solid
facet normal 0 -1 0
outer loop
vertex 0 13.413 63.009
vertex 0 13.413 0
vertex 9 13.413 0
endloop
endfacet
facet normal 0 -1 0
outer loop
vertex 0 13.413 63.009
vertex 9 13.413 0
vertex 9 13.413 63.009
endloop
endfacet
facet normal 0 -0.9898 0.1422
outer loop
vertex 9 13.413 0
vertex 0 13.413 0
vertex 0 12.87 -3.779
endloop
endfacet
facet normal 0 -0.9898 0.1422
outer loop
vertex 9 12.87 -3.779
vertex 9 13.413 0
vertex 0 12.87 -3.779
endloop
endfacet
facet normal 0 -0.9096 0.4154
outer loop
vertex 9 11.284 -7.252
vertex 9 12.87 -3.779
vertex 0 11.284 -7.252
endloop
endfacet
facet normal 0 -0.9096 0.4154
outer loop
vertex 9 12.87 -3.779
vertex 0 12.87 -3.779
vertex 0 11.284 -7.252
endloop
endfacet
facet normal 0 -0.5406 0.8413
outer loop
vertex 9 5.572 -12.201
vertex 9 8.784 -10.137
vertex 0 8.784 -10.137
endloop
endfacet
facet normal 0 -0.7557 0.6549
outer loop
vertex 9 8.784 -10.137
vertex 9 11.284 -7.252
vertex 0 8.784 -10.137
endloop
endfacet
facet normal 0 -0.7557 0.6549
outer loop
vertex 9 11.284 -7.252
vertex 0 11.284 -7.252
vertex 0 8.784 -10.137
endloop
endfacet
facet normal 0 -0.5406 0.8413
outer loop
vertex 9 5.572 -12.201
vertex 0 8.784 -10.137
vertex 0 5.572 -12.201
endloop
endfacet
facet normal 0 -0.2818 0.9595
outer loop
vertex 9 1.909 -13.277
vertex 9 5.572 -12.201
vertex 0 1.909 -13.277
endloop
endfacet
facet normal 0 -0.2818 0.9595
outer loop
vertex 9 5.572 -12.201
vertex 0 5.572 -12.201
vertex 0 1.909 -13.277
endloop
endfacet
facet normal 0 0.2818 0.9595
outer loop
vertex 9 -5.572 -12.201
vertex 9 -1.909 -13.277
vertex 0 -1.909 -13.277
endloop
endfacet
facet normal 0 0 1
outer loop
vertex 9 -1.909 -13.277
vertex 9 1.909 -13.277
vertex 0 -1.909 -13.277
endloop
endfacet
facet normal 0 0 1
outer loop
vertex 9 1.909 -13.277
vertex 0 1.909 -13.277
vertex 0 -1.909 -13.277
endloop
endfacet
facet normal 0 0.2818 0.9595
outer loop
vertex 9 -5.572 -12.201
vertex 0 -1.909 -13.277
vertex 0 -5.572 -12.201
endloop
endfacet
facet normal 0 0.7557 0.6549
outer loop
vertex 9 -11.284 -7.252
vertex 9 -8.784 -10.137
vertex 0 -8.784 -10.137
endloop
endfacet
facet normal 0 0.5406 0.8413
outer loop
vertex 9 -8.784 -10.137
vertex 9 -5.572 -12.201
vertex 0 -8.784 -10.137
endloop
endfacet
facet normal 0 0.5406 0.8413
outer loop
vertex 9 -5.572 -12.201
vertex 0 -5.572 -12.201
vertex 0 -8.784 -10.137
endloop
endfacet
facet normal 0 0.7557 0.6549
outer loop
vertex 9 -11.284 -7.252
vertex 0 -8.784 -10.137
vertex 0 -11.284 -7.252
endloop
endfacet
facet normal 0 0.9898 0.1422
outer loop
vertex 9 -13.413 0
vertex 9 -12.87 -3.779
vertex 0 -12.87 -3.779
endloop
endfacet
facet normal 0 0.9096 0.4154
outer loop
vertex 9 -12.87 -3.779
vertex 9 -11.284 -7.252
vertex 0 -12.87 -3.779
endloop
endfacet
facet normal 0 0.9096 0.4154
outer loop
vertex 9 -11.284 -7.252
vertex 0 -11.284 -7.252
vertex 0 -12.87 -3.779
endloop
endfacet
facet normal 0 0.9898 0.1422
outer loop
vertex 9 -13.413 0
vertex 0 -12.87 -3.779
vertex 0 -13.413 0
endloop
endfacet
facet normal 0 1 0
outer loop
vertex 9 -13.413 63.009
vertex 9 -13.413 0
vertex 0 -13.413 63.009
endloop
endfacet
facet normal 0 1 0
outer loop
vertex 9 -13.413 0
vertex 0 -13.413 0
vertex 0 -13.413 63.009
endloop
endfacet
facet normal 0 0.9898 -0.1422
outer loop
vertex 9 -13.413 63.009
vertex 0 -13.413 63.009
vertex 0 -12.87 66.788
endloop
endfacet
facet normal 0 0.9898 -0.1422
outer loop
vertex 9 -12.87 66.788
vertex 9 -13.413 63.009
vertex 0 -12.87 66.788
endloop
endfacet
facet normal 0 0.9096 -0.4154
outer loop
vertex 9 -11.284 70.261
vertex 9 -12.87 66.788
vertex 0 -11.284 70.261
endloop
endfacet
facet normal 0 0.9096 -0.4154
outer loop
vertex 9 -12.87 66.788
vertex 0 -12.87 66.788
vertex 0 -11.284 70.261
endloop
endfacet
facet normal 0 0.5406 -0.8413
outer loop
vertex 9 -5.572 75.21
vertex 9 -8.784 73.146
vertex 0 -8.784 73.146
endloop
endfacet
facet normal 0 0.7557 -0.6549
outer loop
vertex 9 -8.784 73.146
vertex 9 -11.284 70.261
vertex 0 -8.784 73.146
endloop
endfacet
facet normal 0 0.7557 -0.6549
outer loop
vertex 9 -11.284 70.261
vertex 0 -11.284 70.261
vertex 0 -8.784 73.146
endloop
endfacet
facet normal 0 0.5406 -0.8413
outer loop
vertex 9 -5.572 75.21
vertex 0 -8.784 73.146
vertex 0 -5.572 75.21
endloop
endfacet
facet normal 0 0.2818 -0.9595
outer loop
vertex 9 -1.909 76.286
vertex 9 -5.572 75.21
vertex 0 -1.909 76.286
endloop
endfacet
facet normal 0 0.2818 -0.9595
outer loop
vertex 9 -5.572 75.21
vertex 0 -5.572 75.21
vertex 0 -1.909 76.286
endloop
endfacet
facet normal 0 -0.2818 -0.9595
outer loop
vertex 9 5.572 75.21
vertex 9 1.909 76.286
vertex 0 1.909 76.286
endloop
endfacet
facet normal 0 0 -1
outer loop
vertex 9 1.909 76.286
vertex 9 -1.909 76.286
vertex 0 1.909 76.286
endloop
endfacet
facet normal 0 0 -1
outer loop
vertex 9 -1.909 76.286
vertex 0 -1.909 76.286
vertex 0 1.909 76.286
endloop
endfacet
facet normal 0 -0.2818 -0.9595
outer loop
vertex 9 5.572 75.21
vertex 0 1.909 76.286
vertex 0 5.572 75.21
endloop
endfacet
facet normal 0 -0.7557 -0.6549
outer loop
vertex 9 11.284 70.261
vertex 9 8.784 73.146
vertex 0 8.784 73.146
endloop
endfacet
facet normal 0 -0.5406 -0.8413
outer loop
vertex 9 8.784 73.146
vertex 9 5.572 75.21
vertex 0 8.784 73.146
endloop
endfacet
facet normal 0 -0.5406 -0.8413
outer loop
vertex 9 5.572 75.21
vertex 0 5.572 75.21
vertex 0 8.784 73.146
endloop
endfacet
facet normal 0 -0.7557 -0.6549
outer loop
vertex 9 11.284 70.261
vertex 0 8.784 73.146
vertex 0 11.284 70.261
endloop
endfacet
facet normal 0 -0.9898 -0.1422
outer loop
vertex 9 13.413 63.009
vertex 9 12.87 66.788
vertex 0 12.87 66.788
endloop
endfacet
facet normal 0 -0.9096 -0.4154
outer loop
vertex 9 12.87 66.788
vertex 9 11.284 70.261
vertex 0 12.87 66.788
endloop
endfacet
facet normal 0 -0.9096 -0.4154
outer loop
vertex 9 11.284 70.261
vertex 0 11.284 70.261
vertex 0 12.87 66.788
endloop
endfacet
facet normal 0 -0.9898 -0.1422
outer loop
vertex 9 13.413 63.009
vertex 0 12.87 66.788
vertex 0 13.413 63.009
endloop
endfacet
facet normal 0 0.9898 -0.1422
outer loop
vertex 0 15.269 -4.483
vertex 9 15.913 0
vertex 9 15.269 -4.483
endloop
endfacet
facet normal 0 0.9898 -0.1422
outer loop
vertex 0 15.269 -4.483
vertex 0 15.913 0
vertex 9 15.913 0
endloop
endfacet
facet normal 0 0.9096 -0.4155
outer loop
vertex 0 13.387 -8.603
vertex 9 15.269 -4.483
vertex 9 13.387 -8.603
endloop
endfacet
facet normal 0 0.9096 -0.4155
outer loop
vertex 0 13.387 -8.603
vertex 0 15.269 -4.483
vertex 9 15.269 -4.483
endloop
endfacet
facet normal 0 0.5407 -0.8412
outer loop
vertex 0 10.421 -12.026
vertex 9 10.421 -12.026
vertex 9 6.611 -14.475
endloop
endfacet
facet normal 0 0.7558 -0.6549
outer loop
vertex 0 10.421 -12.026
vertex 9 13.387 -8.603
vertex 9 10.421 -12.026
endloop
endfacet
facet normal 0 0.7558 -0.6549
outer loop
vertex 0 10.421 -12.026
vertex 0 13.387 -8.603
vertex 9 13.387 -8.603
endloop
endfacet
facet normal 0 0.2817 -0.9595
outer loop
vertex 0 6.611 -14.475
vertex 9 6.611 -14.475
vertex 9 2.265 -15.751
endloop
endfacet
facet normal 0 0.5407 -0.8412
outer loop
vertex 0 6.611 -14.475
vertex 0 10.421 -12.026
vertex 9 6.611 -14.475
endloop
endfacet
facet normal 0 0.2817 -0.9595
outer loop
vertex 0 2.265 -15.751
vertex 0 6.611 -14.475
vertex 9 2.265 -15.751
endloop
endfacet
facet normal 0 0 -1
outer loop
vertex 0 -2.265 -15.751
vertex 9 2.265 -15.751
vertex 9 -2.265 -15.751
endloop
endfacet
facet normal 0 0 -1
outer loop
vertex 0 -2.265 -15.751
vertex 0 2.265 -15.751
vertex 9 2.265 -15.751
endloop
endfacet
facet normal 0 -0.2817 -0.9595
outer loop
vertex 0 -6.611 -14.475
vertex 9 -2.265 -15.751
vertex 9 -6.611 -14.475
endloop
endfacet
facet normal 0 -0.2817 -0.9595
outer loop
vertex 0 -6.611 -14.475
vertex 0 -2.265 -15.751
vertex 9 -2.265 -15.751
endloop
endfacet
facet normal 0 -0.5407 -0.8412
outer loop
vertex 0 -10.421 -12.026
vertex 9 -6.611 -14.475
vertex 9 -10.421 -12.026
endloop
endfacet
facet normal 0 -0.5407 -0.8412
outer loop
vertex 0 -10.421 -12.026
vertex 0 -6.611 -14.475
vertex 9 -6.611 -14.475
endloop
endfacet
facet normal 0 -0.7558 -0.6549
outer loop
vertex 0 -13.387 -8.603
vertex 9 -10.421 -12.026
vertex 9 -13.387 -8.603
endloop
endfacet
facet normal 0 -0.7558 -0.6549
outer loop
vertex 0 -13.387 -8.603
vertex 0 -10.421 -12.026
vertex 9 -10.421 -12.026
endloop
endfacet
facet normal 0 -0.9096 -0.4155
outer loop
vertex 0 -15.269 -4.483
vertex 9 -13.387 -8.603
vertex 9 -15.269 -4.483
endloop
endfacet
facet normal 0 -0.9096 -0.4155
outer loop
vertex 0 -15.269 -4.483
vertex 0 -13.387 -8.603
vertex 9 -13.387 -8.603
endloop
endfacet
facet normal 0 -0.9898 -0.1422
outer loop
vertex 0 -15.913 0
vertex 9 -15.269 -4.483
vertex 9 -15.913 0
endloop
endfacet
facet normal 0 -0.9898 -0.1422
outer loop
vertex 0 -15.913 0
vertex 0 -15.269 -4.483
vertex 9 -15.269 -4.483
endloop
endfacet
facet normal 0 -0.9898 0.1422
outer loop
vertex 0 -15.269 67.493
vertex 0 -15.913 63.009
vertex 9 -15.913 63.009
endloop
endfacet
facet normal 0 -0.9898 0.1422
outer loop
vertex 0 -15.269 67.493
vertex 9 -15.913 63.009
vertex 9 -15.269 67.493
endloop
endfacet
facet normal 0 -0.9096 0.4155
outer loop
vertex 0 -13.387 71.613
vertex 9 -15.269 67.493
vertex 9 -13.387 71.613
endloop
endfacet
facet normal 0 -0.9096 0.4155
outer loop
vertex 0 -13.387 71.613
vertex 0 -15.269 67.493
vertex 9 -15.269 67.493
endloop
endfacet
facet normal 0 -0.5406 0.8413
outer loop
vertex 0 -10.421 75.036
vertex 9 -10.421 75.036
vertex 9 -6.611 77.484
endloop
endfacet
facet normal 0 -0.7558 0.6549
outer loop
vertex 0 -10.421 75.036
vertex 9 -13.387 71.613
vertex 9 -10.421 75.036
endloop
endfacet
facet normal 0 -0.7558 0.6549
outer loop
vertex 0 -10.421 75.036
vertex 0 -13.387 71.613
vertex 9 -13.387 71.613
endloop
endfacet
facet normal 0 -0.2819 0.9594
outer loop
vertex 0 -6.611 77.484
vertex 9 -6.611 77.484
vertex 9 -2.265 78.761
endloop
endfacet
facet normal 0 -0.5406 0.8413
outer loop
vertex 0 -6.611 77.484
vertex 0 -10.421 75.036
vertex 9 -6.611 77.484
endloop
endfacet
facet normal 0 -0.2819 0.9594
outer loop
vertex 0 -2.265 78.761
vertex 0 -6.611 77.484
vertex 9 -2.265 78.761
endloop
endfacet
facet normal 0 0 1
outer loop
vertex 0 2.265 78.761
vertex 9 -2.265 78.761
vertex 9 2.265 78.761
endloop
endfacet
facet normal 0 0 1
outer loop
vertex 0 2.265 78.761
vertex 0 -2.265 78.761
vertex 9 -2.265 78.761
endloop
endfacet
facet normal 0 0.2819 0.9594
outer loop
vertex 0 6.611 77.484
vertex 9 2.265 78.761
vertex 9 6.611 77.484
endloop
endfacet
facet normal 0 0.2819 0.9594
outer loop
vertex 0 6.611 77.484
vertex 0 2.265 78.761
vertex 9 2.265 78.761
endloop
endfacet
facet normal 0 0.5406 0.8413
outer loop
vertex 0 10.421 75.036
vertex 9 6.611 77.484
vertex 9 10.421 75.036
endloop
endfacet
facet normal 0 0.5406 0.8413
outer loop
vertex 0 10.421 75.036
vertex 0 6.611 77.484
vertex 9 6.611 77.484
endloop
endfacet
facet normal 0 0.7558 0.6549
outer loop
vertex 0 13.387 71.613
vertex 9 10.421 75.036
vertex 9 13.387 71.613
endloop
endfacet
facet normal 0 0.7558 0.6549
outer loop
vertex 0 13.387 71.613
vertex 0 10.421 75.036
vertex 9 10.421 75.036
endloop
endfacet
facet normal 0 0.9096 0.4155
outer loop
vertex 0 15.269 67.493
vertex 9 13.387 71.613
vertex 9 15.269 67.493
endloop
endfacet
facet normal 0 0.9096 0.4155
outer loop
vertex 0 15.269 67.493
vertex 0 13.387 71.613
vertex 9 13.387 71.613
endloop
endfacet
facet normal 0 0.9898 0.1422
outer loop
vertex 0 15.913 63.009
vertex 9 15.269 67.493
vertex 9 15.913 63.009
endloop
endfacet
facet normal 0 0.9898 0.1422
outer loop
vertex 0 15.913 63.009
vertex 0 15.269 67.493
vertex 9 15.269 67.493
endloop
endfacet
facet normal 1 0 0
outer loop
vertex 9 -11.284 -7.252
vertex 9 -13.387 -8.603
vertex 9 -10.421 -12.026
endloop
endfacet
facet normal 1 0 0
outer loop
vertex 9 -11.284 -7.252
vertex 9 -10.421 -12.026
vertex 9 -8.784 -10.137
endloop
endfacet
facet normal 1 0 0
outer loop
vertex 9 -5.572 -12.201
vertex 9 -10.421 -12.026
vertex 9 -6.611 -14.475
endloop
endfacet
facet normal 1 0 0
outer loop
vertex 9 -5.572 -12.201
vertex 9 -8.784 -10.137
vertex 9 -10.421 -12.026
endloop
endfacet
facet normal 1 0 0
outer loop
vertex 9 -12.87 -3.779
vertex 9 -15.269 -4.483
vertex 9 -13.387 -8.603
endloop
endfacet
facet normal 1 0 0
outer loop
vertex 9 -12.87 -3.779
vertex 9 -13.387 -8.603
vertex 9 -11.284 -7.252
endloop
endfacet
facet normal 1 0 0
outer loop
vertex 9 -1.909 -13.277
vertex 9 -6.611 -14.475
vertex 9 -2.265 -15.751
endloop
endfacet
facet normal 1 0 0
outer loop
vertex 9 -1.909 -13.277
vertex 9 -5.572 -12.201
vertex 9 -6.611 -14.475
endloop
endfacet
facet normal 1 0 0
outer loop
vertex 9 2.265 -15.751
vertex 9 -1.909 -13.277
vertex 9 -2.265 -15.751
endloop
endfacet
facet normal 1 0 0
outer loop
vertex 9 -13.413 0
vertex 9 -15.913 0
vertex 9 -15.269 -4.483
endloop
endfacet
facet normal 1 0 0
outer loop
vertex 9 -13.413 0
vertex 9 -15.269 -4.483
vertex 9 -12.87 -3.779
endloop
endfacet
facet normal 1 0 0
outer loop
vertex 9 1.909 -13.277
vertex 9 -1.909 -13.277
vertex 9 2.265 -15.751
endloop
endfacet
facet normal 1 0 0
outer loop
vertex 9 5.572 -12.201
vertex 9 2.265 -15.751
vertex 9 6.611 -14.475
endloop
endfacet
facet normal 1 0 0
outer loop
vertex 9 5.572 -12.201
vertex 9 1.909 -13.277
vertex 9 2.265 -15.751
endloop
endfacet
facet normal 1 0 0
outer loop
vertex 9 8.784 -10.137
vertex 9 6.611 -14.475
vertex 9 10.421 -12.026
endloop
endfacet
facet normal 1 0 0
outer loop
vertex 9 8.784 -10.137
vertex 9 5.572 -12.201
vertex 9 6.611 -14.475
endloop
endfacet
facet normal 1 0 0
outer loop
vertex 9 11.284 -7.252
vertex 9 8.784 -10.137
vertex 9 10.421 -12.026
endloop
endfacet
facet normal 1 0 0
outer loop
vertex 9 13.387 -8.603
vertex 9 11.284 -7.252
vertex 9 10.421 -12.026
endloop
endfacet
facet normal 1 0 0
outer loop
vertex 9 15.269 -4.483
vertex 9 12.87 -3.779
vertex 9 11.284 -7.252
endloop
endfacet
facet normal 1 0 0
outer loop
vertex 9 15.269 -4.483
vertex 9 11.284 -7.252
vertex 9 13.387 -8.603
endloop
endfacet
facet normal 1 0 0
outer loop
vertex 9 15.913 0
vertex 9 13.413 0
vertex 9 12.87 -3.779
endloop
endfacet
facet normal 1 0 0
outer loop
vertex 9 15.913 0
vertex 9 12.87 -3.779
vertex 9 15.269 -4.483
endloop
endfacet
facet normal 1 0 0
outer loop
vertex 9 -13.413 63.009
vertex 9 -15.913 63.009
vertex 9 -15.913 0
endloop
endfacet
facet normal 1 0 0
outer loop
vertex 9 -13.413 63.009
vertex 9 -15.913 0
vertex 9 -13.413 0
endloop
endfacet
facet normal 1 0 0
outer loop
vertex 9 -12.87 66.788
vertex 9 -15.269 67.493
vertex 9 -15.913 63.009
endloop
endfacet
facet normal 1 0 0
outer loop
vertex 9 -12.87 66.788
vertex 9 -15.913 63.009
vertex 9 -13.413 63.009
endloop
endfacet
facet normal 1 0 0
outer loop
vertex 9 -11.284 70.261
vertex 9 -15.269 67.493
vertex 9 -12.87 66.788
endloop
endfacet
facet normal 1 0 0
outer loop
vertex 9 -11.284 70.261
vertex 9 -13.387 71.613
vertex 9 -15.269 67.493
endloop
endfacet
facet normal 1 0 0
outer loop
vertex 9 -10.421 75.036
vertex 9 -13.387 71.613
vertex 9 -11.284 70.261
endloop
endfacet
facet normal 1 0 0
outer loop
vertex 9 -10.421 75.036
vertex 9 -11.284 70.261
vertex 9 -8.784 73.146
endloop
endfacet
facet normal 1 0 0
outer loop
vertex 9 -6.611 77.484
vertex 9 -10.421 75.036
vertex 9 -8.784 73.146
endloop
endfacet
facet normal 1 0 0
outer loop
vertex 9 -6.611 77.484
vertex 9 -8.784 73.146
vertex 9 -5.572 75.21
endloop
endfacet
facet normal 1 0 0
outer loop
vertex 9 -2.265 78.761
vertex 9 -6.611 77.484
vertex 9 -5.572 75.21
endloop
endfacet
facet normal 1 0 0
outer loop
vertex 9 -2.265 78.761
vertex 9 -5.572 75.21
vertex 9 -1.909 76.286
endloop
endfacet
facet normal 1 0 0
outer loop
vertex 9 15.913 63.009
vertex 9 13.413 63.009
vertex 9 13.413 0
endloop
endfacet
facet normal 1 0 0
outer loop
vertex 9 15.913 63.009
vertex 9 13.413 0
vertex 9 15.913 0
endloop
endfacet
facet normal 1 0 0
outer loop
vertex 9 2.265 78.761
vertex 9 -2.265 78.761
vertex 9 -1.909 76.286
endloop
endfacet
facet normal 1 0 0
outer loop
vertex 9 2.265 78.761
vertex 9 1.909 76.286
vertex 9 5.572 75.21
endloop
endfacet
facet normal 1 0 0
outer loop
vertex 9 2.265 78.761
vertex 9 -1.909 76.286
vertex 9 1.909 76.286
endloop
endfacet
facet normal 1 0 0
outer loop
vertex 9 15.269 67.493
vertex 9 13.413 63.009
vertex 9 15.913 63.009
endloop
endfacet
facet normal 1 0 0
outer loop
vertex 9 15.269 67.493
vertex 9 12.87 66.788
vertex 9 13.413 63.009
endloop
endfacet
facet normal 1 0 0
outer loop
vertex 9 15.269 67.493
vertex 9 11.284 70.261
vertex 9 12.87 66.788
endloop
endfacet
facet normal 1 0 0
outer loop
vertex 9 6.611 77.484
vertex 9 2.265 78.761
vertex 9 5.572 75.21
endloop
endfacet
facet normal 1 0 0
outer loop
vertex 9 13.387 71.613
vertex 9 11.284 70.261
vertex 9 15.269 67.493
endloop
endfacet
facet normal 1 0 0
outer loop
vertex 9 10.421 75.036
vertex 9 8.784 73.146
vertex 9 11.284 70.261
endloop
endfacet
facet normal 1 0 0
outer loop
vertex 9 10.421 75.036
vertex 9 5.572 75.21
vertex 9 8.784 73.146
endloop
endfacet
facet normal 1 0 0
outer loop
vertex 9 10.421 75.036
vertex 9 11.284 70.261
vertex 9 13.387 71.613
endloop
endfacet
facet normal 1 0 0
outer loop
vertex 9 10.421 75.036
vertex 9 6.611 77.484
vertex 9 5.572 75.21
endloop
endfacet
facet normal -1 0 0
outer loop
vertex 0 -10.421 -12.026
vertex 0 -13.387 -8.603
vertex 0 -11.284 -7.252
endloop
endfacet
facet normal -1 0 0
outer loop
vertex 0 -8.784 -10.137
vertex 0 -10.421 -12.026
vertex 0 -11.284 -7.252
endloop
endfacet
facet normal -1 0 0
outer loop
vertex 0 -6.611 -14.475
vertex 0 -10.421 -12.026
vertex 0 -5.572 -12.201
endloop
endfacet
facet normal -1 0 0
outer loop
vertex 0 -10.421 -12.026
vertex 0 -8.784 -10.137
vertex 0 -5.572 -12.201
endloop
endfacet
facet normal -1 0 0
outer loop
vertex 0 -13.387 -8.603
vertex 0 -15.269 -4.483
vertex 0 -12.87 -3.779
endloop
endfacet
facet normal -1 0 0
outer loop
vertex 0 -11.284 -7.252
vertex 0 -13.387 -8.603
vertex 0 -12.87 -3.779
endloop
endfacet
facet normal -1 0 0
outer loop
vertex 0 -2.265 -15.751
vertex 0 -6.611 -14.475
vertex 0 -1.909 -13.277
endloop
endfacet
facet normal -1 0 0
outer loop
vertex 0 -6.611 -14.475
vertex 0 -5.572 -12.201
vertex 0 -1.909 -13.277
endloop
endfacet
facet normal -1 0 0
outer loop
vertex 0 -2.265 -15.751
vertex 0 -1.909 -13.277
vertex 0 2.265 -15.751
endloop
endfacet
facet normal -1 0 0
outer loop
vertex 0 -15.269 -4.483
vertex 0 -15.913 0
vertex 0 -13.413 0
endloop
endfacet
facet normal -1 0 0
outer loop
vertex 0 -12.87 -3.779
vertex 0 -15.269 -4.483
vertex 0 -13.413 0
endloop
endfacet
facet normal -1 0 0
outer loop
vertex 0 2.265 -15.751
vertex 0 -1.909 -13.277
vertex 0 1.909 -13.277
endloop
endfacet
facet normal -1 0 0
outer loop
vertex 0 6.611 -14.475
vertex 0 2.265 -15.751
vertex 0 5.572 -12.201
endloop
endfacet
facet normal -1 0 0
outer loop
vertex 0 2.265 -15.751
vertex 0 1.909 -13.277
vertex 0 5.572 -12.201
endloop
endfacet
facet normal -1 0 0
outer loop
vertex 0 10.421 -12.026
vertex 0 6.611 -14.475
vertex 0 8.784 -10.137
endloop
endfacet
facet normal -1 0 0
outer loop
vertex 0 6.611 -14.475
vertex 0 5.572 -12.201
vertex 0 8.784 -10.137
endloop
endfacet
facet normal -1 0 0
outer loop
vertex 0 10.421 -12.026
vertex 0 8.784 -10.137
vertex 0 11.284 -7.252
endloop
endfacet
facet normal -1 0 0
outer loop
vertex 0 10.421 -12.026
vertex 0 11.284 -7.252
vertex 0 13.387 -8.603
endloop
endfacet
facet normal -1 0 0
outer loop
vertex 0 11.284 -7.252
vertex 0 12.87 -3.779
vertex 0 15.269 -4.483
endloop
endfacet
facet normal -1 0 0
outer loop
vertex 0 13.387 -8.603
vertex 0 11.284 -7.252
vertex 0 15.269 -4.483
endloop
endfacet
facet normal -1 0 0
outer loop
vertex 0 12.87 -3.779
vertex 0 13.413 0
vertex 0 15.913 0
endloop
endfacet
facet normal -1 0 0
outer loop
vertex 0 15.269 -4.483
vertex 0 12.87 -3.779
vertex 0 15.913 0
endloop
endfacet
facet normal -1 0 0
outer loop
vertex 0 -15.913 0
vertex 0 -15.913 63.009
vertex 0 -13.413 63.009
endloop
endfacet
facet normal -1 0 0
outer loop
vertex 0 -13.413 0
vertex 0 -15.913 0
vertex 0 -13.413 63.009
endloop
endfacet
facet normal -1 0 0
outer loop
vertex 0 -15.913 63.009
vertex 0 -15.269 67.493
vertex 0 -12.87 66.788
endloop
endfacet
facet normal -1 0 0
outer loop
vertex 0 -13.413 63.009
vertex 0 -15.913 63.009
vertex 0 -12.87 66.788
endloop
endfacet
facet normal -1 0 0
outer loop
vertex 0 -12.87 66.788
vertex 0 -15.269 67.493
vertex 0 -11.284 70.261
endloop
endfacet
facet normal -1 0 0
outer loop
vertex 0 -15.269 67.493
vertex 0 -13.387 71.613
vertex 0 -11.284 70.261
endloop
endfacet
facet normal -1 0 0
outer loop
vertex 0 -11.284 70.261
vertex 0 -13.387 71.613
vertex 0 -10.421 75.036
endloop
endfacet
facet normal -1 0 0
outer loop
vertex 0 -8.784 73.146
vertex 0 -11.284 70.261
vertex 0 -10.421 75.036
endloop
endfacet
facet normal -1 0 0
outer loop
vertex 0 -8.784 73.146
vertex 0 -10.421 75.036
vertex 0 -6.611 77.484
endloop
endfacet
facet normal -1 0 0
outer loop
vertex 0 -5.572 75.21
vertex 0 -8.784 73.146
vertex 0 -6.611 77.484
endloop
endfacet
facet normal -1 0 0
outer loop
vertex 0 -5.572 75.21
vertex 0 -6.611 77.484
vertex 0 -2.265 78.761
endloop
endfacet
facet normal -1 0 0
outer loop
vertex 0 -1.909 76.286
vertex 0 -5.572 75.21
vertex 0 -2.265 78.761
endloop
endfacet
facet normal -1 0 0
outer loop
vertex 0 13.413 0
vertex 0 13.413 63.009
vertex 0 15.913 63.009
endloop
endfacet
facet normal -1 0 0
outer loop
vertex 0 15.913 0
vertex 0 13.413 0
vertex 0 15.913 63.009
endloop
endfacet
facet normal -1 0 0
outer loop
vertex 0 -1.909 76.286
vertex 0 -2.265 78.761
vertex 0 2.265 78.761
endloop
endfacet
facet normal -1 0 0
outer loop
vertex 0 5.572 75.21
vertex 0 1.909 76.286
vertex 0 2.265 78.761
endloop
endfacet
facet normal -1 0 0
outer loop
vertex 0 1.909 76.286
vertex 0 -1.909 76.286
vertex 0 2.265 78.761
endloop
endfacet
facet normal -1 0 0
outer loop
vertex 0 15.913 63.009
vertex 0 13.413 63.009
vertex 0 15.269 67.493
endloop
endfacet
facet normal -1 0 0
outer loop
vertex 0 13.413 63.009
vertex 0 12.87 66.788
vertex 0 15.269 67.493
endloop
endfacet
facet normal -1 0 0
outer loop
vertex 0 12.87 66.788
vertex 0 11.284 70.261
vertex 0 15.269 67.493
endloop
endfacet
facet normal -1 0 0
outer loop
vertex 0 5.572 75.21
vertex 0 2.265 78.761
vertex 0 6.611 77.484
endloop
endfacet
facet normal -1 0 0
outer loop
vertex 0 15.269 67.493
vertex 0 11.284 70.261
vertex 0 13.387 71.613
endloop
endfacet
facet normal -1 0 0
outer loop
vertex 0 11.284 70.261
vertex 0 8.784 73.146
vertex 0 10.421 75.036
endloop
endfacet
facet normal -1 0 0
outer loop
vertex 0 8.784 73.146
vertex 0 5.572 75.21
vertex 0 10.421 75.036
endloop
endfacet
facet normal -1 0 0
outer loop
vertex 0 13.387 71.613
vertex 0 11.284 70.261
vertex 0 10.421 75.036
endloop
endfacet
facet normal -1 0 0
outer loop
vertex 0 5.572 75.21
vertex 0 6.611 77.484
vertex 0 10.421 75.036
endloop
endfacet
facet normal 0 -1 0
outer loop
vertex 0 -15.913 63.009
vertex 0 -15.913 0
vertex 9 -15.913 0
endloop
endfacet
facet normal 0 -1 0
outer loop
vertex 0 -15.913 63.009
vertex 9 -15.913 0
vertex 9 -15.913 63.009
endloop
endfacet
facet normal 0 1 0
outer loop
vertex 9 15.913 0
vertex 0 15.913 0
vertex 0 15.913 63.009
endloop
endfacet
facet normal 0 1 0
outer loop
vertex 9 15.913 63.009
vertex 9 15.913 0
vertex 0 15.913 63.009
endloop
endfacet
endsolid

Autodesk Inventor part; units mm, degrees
ref_plane "YZ Plane" through (0, 0, 0) normal (1, 0, 0) x (0, 1, 0)
ref_plane "XZ Plane" through (0, 0, 0) normal (0, 1, 0) x (-1, 0, 0)
ref_plane "XY Plane" through (0, 0, 0) normal (0, 0, 1) x (1, 0, 0)
sketch "Sketch1" plane through (0, 0, 0) normal (1, 0, 0) x (0, 1, 0)
  arc A0 (-13.4131, 0) -> (13.4131, 0) centre (0, 0) ccw
  arc A1 (-15.9131, 0) -> (15.9131, 0) centre (0, 0) ccw
  arc A2 (13.4131, 63.0094) -> (-13.4131, 63.0094) centre (0, 63.0094) ccw
  arc A3 (15.9131, 63.0094) -> (-15.9131, 63.0094) centre (0, 63.0094) ccw
  line L0 (13.4131, 0) -> (13.4131, 63.0094)
  line L1 (-13.4131, 0) -> (-13.4131, 63.0094)
  line L2 (15.9131, 0) -> (15.9131, 63.0094)
  line L3 (-15.9131, 0) -> (-15.9131, 63.0094)
  dimension "d0" = 2.5
  dimension "d1" = 13.4131
  dimension "d2" = 63.0094
extrude "Extrusion1" add sketch "Sketch1" along normal blind 9
properties part number "STANDIN,130T,HTD5mm,BELT" material "Nylon 6/6"
